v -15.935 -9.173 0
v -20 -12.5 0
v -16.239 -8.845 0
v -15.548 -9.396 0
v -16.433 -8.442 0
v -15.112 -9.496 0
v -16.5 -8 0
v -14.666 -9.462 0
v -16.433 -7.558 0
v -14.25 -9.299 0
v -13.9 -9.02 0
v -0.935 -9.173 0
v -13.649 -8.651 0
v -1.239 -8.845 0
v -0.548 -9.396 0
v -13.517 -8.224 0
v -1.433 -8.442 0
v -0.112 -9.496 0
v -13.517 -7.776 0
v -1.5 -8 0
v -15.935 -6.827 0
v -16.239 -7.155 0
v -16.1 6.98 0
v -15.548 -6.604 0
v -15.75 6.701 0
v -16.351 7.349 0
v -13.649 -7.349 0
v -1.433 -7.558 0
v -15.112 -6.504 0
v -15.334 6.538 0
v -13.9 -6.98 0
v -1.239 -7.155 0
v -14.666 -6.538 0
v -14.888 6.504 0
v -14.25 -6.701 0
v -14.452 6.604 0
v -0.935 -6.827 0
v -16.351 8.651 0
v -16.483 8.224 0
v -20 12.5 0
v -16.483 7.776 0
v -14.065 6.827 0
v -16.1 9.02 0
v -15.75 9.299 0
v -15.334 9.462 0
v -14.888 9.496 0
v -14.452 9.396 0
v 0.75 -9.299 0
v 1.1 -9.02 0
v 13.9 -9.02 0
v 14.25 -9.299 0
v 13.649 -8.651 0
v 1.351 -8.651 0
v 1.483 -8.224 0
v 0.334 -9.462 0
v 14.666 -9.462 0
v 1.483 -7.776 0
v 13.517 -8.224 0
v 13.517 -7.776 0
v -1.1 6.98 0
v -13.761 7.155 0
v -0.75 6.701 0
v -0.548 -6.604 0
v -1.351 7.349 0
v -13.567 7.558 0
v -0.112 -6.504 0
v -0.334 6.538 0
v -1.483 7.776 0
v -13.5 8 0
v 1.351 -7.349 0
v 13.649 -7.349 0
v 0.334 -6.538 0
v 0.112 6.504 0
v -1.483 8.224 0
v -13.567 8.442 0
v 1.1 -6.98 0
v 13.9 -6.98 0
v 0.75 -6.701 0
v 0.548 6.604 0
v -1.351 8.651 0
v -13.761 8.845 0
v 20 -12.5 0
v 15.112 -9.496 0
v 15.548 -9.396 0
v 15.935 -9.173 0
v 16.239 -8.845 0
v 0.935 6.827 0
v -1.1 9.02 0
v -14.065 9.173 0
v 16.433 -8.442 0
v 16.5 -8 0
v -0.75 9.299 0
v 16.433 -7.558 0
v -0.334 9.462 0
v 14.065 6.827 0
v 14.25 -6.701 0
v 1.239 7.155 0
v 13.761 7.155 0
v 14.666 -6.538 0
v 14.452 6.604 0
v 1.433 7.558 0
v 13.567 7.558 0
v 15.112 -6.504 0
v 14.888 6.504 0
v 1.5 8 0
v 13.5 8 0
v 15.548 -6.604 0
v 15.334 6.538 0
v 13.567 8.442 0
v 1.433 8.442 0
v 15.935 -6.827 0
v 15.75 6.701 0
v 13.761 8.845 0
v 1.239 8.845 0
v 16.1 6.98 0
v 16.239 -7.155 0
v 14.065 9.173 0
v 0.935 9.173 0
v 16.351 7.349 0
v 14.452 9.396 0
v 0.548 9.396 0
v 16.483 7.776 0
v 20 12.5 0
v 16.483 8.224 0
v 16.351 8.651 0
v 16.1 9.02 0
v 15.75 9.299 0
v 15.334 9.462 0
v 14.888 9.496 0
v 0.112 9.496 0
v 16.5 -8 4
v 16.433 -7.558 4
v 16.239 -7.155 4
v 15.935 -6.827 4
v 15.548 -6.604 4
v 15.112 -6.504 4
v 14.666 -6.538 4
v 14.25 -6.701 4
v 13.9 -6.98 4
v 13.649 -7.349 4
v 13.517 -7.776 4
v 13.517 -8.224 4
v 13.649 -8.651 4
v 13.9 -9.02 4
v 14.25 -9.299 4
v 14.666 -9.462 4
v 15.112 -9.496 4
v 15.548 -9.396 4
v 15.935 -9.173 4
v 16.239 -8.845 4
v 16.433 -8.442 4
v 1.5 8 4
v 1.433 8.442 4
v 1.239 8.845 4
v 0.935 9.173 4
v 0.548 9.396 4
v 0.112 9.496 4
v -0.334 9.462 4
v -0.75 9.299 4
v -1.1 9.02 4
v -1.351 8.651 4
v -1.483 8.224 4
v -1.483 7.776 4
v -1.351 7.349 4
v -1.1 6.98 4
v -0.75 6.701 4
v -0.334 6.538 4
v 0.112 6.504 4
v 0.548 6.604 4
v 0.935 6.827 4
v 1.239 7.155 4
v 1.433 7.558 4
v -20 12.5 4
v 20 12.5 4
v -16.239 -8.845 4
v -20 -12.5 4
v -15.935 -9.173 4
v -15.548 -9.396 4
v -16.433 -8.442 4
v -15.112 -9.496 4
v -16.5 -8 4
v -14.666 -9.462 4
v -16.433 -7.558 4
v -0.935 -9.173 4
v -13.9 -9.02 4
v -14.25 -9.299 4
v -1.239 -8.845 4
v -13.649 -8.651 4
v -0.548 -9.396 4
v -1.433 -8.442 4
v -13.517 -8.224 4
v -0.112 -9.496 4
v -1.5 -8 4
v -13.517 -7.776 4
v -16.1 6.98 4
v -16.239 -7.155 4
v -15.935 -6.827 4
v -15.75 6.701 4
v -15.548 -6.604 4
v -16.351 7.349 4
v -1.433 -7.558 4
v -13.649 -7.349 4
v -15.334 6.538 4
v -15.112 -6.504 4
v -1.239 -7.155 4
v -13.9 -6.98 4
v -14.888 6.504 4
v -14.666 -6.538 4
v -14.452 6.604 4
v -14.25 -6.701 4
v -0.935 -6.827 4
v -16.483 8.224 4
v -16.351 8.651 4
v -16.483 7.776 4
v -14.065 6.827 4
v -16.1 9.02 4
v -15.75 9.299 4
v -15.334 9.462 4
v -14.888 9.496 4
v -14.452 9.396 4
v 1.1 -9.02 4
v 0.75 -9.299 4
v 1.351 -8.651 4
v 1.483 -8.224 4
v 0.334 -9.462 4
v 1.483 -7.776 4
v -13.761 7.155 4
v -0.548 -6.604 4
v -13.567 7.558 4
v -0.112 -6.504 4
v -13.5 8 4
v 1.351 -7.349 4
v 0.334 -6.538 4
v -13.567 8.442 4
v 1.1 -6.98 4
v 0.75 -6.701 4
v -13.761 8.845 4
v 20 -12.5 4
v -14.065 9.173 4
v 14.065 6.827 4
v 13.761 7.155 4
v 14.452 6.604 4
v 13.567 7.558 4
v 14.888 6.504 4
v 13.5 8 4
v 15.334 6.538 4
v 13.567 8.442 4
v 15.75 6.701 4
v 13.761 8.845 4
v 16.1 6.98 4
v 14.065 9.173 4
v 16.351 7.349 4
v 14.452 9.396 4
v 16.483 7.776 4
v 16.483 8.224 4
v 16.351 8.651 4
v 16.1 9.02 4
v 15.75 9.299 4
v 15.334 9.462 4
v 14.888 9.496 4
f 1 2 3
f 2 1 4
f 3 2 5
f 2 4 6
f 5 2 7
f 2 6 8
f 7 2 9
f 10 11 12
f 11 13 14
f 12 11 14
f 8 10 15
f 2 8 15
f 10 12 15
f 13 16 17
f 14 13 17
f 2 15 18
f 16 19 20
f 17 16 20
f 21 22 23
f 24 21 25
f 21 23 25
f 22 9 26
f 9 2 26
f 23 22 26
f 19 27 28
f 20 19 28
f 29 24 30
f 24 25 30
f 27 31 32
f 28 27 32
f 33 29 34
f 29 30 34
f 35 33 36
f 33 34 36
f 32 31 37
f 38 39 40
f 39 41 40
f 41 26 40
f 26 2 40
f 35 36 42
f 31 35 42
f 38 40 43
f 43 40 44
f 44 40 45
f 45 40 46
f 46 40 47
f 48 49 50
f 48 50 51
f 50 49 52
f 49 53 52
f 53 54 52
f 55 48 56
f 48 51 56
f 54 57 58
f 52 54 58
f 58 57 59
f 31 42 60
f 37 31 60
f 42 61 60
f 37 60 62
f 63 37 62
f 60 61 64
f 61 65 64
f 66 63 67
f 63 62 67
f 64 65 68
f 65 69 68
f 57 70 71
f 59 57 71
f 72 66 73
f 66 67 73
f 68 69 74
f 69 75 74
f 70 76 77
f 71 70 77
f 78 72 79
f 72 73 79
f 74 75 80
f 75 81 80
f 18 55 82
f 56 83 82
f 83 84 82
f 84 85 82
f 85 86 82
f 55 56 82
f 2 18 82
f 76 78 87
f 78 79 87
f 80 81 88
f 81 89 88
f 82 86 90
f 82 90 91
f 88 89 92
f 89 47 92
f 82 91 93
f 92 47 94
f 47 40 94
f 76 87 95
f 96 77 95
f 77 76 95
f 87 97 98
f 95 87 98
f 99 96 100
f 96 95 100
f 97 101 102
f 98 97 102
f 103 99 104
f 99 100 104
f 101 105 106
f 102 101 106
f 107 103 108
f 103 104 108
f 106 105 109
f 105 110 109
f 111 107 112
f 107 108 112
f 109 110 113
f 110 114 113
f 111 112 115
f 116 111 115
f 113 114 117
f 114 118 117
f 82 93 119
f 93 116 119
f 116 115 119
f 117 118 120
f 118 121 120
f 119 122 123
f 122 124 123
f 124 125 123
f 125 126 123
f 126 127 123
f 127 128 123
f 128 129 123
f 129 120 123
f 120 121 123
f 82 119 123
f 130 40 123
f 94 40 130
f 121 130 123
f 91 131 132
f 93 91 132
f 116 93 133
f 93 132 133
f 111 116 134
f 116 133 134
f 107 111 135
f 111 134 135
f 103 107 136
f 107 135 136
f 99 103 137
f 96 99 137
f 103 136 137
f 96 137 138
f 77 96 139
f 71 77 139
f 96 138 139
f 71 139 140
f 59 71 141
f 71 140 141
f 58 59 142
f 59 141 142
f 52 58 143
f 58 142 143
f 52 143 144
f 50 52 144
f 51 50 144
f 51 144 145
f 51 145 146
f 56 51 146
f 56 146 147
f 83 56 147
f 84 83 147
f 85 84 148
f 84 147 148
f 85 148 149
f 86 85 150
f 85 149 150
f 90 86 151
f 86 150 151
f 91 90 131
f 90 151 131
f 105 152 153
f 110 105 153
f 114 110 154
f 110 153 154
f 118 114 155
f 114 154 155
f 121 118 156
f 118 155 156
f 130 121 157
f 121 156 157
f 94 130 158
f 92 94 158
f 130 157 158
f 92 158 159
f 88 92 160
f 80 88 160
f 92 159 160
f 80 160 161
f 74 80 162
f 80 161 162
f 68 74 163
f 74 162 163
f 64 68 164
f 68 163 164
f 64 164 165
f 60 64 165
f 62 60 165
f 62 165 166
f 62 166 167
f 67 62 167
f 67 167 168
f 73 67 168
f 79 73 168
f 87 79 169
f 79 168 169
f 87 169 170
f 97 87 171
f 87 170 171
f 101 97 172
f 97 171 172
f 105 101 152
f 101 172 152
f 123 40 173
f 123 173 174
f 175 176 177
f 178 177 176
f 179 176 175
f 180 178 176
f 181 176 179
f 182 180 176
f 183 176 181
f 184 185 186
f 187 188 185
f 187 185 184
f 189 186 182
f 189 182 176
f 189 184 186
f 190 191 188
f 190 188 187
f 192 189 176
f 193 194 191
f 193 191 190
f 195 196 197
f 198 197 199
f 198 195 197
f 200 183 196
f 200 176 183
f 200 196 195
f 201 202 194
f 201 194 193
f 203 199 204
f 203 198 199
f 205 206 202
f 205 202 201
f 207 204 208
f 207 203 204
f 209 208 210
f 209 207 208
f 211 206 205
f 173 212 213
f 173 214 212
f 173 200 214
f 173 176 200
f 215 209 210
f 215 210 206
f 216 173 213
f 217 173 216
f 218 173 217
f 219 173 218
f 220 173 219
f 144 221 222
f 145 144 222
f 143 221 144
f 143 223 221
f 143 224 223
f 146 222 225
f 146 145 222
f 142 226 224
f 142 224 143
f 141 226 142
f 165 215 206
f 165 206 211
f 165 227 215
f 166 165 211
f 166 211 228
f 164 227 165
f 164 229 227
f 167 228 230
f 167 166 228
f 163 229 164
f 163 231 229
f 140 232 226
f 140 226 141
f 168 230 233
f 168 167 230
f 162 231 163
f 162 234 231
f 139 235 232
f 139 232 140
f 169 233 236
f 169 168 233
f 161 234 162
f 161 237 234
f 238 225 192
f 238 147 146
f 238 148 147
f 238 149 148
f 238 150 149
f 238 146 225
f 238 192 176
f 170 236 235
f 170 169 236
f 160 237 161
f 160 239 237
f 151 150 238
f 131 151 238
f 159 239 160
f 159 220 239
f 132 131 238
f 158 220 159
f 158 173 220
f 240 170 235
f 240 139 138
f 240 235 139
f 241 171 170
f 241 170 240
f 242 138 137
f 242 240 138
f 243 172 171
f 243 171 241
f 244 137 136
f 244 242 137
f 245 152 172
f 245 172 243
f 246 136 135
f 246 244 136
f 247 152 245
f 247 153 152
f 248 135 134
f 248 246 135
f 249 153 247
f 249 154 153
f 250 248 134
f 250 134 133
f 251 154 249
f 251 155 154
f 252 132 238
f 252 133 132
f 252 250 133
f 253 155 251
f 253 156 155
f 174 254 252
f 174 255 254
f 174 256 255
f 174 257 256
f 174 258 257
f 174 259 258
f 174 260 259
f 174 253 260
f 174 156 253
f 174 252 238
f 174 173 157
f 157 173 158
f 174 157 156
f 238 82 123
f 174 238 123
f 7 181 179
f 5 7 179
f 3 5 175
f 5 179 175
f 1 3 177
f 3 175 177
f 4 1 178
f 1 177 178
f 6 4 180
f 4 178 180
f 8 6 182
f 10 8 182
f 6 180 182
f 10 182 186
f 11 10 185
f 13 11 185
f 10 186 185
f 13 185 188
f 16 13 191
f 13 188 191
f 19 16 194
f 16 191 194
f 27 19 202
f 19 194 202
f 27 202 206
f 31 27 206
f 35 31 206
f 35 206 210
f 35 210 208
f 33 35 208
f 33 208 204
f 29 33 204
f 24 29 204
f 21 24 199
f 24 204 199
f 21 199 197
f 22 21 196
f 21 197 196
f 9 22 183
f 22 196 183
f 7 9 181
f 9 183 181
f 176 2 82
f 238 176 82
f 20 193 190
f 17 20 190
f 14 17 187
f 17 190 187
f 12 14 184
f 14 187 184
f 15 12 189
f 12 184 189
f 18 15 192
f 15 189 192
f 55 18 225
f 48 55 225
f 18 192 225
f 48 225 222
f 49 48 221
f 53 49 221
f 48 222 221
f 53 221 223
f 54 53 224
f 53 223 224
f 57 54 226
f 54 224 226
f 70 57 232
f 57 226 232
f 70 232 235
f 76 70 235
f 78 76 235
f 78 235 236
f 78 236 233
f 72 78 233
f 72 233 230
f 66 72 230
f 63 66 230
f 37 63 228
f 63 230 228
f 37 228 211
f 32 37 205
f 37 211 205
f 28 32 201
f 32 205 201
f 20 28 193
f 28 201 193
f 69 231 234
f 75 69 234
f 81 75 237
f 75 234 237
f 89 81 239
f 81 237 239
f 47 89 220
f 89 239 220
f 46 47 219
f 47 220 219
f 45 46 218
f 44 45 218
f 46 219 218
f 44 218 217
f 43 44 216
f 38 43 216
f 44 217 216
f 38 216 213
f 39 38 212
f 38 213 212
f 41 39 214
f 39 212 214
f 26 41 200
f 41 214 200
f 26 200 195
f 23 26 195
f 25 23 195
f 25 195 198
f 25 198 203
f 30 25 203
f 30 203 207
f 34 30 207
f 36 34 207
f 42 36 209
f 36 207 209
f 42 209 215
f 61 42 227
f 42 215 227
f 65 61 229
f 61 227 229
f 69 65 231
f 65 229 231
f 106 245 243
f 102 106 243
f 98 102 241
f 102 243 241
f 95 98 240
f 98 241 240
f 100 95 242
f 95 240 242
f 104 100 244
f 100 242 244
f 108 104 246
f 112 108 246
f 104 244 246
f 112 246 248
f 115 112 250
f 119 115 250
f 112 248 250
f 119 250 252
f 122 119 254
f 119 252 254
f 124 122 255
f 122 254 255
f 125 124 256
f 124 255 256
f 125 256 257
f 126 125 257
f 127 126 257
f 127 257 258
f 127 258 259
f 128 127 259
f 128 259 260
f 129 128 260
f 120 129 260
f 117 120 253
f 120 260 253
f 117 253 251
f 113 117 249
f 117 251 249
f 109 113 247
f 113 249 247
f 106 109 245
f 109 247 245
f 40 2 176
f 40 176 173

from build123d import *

# Parameters (mm, degrees)
SKETCH_2_W          = 40
SKETCH_2_H          = 25
EXTRUDE_1_DEPTH     = 4
SKETCH_3_R          = 1.5
CUT_EXTRUDE_1_DEPTH = 4


with BuildPart() as part:
    # 草图2 → 凸台-拉伸1 (new body)
    with BuildSketch(Plane.XY):
        Rectangle(SKETCH_2_W, SKETCH_2_H)
    extrude(amount=EXTRUDE_1_DEPTH)

    # 草图3 → 切除-拉伸1 (cut)
    with BuildSketch(Plane.XY.offset(4)):
        with Locations((-15, 8)):
            Circle(SKETCH_3_R)
        with Locations((0, 8)):
            Circle(SKETCH_3_R)
        with Locations(Location((15, 8, 0), (0, 0, 180))):
            Circle(SKETCH_3_R)
        with Locations((15, -8)):
            Circle(SKETCH_3_R)
        with Locations(Location((0, -8, 0), (0, 0, 180))):
            Circle(SKETCH_3_R)
        with Locations(Location((-15, -8, 0), (0, 0, 180))):
            Circle(SKETCH_3_R)
    extrude(amount=-CUT_EXTRUDE_1_DEPTH, mode=Mode.SUBTRACT)


solid = part.part
